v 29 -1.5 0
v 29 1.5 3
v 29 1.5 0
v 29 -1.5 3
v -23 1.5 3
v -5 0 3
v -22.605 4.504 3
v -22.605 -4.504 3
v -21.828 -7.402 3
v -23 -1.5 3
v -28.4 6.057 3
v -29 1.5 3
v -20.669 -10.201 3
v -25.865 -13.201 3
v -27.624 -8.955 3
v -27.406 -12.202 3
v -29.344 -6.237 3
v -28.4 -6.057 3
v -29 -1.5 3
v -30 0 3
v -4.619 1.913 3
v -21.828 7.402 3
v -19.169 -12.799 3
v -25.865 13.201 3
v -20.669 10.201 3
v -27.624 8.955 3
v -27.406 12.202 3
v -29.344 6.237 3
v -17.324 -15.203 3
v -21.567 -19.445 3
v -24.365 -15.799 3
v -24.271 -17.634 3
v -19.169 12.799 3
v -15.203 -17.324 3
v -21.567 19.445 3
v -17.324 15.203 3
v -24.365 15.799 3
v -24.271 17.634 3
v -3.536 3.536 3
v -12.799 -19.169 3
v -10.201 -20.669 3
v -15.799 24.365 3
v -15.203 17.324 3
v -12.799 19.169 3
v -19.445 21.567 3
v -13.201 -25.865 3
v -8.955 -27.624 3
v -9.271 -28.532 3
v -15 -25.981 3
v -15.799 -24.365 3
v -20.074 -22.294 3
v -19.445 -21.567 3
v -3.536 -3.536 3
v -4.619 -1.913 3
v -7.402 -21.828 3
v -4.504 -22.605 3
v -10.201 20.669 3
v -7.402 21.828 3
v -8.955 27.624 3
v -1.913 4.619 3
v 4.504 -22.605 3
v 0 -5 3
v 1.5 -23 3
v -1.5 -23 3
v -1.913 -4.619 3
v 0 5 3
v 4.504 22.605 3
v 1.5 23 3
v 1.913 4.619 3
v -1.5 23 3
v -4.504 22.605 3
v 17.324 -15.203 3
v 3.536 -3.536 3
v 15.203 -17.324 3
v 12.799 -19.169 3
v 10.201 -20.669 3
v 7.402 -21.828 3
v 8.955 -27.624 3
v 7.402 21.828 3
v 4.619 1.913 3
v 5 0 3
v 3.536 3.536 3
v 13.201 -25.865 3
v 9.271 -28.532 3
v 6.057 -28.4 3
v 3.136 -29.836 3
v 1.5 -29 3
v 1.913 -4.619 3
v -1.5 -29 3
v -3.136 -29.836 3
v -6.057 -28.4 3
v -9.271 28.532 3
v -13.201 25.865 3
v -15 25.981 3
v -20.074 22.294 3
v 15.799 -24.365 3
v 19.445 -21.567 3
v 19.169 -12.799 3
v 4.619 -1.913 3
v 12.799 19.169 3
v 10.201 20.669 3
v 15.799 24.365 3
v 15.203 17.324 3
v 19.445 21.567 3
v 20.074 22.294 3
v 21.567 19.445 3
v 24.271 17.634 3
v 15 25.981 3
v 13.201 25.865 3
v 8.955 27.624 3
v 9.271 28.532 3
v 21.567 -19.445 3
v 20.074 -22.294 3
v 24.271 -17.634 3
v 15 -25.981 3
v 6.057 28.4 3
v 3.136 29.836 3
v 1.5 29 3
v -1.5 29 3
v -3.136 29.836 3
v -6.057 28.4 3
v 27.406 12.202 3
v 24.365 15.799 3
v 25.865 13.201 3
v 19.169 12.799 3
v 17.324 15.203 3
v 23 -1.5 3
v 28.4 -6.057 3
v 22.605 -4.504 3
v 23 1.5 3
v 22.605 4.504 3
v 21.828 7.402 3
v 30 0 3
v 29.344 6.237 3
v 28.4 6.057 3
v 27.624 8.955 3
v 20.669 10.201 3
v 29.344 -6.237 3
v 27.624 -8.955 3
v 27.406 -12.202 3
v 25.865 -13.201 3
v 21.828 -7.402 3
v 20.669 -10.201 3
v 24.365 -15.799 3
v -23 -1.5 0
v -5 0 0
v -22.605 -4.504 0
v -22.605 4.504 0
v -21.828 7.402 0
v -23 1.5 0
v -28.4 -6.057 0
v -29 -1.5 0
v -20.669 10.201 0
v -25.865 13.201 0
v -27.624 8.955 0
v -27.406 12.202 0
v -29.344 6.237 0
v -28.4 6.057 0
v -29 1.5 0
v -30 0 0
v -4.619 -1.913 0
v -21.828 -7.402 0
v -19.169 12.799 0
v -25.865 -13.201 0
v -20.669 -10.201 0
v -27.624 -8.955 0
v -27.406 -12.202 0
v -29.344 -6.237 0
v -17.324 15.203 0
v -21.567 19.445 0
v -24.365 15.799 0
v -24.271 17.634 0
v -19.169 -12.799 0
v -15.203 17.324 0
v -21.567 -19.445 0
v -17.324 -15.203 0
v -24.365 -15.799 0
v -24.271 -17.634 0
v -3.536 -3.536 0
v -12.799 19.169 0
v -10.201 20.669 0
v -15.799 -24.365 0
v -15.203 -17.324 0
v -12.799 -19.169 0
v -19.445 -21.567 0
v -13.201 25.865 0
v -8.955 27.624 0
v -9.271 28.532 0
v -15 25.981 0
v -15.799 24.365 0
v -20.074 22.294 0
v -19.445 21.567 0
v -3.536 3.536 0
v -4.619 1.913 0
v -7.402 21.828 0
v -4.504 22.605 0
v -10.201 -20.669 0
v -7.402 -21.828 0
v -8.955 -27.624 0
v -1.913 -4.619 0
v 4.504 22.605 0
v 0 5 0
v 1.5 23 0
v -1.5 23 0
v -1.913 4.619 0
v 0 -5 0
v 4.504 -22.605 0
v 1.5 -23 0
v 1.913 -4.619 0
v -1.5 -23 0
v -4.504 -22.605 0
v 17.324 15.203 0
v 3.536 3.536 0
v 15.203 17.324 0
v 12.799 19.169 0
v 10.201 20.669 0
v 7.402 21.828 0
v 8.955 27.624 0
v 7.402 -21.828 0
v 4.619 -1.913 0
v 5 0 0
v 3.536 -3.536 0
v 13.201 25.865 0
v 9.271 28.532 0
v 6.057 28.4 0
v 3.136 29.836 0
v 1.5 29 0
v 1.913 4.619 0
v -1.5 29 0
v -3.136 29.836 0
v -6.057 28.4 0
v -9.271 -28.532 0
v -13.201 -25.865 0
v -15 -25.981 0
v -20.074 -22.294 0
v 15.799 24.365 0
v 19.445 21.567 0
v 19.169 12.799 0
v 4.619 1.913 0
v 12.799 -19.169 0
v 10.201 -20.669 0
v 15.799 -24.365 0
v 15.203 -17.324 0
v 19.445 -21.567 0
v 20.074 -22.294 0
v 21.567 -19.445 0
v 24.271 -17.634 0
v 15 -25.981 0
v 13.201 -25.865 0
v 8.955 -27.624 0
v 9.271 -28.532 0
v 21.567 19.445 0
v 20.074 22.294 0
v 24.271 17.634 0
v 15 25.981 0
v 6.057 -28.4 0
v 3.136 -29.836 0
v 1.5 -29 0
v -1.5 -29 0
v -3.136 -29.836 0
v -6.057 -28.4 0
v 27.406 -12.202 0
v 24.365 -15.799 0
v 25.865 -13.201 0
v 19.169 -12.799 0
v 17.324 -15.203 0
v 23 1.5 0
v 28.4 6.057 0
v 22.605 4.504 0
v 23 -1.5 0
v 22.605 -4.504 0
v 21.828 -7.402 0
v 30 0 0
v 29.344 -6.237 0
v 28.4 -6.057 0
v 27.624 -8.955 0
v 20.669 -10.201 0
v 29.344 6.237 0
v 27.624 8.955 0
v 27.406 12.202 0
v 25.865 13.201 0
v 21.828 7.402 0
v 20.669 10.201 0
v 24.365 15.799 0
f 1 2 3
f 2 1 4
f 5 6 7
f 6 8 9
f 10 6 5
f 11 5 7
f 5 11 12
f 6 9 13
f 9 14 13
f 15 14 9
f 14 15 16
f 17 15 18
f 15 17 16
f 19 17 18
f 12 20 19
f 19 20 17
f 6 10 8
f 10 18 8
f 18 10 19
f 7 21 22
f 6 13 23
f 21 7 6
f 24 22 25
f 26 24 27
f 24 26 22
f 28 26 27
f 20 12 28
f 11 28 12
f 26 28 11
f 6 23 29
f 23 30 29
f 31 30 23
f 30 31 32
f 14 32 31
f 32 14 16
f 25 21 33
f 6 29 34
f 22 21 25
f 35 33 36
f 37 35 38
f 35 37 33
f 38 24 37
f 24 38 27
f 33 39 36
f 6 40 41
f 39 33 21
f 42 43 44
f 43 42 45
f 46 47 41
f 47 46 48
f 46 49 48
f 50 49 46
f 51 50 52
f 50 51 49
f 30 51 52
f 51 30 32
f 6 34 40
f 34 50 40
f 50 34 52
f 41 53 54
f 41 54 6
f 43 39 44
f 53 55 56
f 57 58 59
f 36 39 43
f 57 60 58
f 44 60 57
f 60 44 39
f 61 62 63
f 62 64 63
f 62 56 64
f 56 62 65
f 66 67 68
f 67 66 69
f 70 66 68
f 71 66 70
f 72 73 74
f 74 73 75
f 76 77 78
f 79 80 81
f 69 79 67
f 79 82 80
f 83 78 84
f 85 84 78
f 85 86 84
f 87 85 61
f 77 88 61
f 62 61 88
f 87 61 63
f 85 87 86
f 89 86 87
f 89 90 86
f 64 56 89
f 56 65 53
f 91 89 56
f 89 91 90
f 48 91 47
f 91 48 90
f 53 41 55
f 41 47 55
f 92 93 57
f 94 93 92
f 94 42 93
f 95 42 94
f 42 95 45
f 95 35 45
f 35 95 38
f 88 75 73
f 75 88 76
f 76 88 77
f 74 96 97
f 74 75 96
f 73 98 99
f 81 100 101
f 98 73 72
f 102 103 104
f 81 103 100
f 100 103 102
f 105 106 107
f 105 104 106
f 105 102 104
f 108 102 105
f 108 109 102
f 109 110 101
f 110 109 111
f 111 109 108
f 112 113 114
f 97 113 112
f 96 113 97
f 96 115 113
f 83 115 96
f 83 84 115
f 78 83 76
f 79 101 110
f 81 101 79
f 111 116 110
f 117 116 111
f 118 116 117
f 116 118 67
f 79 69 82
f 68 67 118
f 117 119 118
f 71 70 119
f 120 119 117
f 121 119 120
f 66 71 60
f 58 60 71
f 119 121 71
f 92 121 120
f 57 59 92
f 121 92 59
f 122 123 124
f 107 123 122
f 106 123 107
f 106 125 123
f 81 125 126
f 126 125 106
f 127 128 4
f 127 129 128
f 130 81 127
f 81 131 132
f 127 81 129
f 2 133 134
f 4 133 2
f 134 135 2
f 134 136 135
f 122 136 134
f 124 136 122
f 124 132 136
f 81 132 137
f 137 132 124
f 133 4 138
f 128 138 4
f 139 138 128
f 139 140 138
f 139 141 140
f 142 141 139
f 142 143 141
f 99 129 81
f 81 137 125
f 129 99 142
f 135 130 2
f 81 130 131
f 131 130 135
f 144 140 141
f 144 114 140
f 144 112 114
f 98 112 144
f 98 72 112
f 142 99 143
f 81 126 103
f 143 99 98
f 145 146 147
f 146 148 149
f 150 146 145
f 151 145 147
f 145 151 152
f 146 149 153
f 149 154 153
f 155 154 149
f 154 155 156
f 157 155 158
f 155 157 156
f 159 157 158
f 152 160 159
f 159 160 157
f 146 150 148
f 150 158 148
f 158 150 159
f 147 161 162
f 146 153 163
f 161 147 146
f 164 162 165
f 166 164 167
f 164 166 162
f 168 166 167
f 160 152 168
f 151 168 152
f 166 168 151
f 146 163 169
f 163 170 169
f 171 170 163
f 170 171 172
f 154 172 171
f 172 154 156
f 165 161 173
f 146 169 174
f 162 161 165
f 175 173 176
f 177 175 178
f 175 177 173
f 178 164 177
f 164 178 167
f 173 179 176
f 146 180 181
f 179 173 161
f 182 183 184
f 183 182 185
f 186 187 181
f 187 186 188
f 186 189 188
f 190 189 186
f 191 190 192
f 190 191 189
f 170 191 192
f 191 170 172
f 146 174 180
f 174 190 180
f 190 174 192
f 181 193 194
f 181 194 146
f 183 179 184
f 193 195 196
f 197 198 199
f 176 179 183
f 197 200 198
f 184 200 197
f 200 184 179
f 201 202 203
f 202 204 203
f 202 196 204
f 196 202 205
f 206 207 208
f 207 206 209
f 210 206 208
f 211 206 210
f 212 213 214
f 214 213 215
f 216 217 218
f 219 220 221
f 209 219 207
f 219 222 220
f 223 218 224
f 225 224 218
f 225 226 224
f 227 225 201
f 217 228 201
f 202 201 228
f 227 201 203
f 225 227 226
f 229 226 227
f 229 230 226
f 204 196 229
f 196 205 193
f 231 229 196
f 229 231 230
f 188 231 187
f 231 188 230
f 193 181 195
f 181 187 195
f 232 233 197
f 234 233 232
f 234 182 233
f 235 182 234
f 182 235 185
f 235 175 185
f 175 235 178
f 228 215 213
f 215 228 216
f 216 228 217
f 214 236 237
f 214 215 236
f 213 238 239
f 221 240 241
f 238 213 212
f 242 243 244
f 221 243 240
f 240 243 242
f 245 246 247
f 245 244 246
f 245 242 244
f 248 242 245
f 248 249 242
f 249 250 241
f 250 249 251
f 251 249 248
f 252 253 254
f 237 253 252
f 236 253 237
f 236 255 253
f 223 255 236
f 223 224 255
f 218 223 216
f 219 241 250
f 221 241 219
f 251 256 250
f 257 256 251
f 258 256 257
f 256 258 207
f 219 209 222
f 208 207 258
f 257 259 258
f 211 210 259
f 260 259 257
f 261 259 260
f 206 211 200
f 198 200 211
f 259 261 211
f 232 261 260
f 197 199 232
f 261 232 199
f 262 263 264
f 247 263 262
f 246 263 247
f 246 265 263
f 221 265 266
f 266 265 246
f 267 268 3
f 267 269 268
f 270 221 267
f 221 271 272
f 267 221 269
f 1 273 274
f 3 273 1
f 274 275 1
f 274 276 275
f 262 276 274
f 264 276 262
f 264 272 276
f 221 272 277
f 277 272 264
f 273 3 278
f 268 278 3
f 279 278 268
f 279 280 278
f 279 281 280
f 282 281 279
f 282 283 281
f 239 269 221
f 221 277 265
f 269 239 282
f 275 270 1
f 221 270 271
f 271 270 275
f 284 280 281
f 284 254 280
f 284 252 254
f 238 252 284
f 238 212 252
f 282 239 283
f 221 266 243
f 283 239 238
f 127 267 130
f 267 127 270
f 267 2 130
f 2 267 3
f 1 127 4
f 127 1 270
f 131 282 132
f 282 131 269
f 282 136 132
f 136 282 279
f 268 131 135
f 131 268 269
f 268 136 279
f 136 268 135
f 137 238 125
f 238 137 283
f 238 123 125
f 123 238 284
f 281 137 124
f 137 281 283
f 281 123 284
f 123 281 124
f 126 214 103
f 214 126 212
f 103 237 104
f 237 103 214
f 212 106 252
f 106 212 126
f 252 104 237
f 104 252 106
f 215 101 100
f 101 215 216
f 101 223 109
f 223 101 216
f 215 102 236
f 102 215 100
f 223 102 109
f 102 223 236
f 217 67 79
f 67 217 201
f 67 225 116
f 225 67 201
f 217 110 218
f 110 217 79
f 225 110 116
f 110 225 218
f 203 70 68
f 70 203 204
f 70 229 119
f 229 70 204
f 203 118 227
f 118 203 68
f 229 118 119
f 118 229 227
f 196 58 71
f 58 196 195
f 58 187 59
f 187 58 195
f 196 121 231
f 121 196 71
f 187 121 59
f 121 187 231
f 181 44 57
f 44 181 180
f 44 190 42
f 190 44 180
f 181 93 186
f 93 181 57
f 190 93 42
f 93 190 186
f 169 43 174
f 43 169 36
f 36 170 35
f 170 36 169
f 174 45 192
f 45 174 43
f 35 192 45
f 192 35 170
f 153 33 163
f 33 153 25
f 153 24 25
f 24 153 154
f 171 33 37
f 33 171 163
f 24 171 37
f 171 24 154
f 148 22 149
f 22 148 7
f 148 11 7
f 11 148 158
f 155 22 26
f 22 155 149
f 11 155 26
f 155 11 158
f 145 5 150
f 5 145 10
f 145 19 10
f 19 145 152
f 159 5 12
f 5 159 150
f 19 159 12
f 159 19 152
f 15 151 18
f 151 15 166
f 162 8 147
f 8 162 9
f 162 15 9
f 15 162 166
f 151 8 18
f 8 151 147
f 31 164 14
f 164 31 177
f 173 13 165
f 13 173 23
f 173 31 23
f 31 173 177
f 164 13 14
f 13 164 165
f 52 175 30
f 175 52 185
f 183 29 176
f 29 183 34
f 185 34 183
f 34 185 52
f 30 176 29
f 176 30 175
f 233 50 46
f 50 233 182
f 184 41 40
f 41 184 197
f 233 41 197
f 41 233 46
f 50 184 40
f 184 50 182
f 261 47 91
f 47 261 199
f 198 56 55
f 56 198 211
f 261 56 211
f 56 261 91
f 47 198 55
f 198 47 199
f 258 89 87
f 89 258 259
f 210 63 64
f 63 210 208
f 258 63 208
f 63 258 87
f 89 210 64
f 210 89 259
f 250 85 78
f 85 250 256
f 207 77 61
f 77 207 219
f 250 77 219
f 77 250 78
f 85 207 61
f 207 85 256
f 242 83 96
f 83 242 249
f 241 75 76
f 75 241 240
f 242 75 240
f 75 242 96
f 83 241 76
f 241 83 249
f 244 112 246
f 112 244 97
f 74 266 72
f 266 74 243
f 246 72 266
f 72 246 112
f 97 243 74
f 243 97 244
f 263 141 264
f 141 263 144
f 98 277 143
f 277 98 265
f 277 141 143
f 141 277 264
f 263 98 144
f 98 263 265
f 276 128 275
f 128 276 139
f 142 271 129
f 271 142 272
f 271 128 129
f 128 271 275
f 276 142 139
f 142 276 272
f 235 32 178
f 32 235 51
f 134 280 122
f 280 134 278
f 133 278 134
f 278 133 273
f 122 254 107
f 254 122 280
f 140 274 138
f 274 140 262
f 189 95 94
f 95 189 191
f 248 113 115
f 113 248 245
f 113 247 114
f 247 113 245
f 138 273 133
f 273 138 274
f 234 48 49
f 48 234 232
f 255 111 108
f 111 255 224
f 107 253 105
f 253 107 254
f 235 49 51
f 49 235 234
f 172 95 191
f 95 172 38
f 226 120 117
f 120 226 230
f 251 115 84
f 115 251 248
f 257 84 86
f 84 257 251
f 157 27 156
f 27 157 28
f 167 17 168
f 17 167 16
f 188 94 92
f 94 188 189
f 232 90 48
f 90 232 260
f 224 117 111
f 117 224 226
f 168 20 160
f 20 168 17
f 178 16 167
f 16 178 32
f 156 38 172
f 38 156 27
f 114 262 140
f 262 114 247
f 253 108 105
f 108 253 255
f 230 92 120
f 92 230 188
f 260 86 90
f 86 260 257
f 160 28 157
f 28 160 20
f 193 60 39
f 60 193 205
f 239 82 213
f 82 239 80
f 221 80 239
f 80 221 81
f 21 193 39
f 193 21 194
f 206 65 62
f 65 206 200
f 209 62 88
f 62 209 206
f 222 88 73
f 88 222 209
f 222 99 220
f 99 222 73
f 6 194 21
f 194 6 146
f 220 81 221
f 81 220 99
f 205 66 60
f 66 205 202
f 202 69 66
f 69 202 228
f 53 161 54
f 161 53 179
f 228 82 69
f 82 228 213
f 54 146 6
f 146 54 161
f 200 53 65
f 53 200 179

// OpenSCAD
/* [Main disc] */

//How big is the main disc.  All values in mm
disc_radius = 30;
//How thick is the main disc.
disc_thickness = 3;
//How big is the center hole?
hole_radius = 5;

/* [Slots] */
//How big is your slot?
slot_height = 6;
//How wide is your slot?
slot_width = 3;
//How far from the edge of the disk do you want the slot?
slot_offset = 1;

//How much rotation before I draw the next slot.  You'll get the best results if this is a clean divisor of 360.
rotate_by = 15; //[1:360]

/* [Hidden] */
current_rotation = 0;

rotate_steps = 360 / rotate_by;

difference(){
    cylinder(disc_thickness,disc_radius,disc_radius);
    cylinder(disc_thickness,hole_radius,hole_radius);
  
    for(i  = [0:1:rotate_steps])
    {
        rotate([0,0,rotate_by*i]){
            slot();
        }
    }
}
    
module slot(){
    translate([disc_radius - slot_height - slot_offset,-(slot_width/2),0]) 
        cube([slot_height,slot_width,disc_thickness]);
}
